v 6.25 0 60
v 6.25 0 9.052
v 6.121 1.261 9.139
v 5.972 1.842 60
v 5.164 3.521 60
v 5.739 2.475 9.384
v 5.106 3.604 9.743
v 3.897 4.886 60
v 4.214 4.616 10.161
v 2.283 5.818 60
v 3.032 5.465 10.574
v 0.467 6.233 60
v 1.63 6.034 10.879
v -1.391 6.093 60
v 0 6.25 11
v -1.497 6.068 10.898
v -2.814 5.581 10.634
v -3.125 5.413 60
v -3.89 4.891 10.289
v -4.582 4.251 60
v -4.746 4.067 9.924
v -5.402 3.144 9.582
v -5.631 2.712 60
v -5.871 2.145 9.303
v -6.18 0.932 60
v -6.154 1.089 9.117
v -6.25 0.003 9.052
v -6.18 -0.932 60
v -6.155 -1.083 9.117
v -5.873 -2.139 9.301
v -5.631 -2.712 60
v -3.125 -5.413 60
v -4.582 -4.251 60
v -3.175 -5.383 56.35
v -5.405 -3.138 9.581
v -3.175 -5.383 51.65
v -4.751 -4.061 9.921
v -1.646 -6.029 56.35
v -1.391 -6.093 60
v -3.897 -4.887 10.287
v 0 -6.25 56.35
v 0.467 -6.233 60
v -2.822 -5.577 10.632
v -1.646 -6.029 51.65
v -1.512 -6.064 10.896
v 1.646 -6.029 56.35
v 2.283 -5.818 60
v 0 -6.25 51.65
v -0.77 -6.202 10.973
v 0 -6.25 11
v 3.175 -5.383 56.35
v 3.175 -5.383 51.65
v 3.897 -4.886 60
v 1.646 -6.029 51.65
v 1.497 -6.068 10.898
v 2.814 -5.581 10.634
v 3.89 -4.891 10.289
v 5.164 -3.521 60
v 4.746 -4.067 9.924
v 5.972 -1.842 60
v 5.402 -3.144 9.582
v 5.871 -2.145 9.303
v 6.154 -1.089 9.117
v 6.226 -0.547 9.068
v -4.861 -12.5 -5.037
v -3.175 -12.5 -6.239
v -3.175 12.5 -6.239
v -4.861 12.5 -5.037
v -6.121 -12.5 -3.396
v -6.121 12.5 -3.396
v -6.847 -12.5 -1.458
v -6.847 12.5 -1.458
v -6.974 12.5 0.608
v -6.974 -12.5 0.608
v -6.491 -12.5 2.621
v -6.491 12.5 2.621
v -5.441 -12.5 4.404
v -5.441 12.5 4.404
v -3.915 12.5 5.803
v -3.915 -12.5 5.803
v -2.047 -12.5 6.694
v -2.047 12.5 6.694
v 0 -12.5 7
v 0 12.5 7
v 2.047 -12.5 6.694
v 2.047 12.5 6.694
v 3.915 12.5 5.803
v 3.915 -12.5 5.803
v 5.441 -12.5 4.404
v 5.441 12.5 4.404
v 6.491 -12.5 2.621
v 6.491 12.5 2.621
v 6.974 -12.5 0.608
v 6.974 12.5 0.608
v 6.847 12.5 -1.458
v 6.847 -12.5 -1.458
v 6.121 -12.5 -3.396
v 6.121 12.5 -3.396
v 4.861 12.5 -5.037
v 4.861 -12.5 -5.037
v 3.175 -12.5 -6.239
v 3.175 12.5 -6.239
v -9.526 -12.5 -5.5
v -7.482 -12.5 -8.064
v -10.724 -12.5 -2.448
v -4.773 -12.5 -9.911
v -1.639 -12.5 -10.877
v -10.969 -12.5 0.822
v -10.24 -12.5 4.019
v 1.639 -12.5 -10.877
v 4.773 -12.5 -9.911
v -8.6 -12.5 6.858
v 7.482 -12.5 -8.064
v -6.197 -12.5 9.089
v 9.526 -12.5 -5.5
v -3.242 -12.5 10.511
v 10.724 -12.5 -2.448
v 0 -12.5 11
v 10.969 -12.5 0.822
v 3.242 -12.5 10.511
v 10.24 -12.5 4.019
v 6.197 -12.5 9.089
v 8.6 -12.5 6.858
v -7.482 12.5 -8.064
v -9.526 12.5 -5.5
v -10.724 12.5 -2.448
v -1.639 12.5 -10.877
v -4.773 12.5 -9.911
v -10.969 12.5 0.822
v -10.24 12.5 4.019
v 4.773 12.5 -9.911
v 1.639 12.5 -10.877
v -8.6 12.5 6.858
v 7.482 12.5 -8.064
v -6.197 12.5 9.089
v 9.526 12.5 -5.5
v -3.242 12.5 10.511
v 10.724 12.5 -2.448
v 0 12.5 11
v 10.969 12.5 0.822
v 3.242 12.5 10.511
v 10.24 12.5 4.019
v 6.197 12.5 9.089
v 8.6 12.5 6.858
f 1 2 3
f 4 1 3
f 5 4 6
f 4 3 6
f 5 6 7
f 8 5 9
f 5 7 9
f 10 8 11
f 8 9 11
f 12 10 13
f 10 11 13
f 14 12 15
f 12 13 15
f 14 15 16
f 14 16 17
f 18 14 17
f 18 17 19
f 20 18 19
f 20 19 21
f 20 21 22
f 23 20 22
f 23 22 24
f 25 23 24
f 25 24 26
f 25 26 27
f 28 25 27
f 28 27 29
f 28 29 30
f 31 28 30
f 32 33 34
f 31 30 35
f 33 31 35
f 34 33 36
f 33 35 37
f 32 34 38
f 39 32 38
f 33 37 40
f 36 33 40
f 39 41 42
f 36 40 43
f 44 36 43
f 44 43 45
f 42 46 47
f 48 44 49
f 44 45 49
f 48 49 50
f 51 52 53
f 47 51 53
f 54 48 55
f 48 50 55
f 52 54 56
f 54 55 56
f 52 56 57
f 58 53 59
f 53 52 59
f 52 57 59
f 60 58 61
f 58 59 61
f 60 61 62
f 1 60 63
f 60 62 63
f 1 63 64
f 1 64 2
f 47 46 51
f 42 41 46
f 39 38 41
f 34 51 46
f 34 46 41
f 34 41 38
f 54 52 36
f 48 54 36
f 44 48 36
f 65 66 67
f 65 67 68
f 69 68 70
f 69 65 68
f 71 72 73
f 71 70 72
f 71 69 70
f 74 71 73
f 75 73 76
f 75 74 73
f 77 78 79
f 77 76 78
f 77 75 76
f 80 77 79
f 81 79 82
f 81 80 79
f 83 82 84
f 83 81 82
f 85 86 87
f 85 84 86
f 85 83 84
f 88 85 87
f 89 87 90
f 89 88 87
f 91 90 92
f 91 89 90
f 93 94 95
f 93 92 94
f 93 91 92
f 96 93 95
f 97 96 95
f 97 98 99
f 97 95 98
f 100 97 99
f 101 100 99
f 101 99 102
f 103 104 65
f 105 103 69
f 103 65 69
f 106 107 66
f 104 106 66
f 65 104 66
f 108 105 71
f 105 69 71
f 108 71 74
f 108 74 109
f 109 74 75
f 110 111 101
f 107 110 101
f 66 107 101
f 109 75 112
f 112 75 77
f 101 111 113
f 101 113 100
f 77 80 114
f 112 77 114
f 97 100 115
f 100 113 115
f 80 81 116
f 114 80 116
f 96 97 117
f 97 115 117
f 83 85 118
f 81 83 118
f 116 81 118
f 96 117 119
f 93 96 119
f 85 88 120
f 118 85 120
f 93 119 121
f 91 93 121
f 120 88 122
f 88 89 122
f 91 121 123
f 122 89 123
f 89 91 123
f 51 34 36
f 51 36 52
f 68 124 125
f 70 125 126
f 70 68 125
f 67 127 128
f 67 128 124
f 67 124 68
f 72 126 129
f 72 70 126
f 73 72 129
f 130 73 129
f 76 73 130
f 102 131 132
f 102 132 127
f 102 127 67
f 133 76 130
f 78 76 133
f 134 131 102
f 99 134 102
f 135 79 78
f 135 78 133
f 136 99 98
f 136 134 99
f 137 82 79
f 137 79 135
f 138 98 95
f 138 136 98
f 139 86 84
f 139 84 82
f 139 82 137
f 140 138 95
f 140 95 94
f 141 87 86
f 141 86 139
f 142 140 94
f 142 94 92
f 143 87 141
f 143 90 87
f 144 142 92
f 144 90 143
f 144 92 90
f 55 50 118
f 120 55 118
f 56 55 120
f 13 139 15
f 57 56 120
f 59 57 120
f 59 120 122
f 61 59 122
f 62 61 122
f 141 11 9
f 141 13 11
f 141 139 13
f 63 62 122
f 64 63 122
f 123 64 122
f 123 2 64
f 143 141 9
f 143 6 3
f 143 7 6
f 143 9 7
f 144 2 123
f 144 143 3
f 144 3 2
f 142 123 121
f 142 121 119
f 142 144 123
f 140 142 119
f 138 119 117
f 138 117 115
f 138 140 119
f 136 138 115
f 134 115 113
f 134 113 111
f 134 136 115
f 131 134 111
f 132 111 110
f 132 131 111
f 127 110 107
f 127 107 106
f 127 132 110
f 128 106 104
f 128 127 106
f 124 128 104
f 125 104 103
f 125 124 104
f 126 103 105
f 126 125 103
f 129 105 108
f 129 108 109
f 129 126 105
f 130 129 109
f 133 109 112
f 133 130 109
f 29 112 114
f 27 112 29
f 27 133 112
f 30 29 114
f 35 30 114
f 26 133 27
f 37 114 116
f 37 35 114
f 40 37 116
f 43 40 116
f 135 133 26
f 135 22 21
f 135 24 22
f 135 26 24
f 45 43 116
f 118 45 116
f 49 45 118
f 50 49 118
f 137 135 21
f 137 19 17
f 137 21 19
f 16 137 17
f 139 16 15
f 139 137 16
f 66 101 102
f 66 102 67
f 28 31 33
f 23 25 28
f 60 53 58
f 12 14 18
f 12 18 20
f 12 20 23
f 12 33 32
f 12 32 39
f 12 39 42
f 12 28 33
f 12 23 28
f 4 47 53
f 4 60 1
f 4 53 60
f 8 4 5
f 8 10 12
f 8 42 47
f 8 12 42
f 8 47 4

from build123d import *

# Parameters (mm, degrees)
SKETCH2_R               = 6.25
BOSS_EXTRUDE3_DEPTH     = 60
SKETCH1_R               = 11
BOSS_EXTRUDE4_DEPTH     = 12.5
CUT_EXTRUDE1_DEPTH      = 63.267567936
CUT_EXTRUDE1_DEPTH_BACK = 63.267567936
CUT_EXTRUDE2_DEPTH      = 2.35


with BuildPart() as part:
    # Sketch2 → Boss-Extrude3 (new body)
    with BuildSketch(Plane.XY):
        Circle(SKETCH2_R)
    extrude(amount=BOSS_EXTRUDE3_DEPTH)

    # Sketch1 → Boss-Extrude4 (add, symmetric)
    with BuildSketch(Plane(origin=(0, 0, 0), x_dir=(1, 0, 0), z_dir=(0, 1, 0))):
        Circle(SKETCH1_R)
    extrude(amount=BOSS_EXTRUDE4_DEPTH, both=True)

    # Sketch1<4> → Cut-Extrude1 (cut, two sides: drawn at the far end of the back side and taken through both)
    with BuildSketch(Plane(origin=(0, 0, 0), x_dir=(1, 0, 0), z_dir=(0, 1, 0)).offset(-CUT_EXTRUDE1_DEPTH_BACK)):
        with BuildLine():
            Line((3.175, 6.238539493), (-3.175, 6.238539493))
            ThreePointArc((-3.175, 6.238539493), (0, -7), (3.175, 6.238539493))
        make_face()
    extrude(amount=CUT_EXTRUDE1_DEPTH + CUT_EXTRUDE1_DEPTH_BACK, mode=Mode.SUBTRACT)

    # Sketch3 → Cut-Extrude2 (cut, symmetric)
    with BuildSketch(Plane.XY.offset(54)):
        with BuildLine():
            Line((-3.175, -5.38348168), (3.175, -5.38348168))
            ThreePointArc((3.175, -5.38348168), (0, -6.25), (-3.175, -5.38348168))
        make_face()
    extrude(amount=CUT_EXTRUDE2_DEPTH, both=True, mode=Mode.SUBTRACT)


solid = part.part
